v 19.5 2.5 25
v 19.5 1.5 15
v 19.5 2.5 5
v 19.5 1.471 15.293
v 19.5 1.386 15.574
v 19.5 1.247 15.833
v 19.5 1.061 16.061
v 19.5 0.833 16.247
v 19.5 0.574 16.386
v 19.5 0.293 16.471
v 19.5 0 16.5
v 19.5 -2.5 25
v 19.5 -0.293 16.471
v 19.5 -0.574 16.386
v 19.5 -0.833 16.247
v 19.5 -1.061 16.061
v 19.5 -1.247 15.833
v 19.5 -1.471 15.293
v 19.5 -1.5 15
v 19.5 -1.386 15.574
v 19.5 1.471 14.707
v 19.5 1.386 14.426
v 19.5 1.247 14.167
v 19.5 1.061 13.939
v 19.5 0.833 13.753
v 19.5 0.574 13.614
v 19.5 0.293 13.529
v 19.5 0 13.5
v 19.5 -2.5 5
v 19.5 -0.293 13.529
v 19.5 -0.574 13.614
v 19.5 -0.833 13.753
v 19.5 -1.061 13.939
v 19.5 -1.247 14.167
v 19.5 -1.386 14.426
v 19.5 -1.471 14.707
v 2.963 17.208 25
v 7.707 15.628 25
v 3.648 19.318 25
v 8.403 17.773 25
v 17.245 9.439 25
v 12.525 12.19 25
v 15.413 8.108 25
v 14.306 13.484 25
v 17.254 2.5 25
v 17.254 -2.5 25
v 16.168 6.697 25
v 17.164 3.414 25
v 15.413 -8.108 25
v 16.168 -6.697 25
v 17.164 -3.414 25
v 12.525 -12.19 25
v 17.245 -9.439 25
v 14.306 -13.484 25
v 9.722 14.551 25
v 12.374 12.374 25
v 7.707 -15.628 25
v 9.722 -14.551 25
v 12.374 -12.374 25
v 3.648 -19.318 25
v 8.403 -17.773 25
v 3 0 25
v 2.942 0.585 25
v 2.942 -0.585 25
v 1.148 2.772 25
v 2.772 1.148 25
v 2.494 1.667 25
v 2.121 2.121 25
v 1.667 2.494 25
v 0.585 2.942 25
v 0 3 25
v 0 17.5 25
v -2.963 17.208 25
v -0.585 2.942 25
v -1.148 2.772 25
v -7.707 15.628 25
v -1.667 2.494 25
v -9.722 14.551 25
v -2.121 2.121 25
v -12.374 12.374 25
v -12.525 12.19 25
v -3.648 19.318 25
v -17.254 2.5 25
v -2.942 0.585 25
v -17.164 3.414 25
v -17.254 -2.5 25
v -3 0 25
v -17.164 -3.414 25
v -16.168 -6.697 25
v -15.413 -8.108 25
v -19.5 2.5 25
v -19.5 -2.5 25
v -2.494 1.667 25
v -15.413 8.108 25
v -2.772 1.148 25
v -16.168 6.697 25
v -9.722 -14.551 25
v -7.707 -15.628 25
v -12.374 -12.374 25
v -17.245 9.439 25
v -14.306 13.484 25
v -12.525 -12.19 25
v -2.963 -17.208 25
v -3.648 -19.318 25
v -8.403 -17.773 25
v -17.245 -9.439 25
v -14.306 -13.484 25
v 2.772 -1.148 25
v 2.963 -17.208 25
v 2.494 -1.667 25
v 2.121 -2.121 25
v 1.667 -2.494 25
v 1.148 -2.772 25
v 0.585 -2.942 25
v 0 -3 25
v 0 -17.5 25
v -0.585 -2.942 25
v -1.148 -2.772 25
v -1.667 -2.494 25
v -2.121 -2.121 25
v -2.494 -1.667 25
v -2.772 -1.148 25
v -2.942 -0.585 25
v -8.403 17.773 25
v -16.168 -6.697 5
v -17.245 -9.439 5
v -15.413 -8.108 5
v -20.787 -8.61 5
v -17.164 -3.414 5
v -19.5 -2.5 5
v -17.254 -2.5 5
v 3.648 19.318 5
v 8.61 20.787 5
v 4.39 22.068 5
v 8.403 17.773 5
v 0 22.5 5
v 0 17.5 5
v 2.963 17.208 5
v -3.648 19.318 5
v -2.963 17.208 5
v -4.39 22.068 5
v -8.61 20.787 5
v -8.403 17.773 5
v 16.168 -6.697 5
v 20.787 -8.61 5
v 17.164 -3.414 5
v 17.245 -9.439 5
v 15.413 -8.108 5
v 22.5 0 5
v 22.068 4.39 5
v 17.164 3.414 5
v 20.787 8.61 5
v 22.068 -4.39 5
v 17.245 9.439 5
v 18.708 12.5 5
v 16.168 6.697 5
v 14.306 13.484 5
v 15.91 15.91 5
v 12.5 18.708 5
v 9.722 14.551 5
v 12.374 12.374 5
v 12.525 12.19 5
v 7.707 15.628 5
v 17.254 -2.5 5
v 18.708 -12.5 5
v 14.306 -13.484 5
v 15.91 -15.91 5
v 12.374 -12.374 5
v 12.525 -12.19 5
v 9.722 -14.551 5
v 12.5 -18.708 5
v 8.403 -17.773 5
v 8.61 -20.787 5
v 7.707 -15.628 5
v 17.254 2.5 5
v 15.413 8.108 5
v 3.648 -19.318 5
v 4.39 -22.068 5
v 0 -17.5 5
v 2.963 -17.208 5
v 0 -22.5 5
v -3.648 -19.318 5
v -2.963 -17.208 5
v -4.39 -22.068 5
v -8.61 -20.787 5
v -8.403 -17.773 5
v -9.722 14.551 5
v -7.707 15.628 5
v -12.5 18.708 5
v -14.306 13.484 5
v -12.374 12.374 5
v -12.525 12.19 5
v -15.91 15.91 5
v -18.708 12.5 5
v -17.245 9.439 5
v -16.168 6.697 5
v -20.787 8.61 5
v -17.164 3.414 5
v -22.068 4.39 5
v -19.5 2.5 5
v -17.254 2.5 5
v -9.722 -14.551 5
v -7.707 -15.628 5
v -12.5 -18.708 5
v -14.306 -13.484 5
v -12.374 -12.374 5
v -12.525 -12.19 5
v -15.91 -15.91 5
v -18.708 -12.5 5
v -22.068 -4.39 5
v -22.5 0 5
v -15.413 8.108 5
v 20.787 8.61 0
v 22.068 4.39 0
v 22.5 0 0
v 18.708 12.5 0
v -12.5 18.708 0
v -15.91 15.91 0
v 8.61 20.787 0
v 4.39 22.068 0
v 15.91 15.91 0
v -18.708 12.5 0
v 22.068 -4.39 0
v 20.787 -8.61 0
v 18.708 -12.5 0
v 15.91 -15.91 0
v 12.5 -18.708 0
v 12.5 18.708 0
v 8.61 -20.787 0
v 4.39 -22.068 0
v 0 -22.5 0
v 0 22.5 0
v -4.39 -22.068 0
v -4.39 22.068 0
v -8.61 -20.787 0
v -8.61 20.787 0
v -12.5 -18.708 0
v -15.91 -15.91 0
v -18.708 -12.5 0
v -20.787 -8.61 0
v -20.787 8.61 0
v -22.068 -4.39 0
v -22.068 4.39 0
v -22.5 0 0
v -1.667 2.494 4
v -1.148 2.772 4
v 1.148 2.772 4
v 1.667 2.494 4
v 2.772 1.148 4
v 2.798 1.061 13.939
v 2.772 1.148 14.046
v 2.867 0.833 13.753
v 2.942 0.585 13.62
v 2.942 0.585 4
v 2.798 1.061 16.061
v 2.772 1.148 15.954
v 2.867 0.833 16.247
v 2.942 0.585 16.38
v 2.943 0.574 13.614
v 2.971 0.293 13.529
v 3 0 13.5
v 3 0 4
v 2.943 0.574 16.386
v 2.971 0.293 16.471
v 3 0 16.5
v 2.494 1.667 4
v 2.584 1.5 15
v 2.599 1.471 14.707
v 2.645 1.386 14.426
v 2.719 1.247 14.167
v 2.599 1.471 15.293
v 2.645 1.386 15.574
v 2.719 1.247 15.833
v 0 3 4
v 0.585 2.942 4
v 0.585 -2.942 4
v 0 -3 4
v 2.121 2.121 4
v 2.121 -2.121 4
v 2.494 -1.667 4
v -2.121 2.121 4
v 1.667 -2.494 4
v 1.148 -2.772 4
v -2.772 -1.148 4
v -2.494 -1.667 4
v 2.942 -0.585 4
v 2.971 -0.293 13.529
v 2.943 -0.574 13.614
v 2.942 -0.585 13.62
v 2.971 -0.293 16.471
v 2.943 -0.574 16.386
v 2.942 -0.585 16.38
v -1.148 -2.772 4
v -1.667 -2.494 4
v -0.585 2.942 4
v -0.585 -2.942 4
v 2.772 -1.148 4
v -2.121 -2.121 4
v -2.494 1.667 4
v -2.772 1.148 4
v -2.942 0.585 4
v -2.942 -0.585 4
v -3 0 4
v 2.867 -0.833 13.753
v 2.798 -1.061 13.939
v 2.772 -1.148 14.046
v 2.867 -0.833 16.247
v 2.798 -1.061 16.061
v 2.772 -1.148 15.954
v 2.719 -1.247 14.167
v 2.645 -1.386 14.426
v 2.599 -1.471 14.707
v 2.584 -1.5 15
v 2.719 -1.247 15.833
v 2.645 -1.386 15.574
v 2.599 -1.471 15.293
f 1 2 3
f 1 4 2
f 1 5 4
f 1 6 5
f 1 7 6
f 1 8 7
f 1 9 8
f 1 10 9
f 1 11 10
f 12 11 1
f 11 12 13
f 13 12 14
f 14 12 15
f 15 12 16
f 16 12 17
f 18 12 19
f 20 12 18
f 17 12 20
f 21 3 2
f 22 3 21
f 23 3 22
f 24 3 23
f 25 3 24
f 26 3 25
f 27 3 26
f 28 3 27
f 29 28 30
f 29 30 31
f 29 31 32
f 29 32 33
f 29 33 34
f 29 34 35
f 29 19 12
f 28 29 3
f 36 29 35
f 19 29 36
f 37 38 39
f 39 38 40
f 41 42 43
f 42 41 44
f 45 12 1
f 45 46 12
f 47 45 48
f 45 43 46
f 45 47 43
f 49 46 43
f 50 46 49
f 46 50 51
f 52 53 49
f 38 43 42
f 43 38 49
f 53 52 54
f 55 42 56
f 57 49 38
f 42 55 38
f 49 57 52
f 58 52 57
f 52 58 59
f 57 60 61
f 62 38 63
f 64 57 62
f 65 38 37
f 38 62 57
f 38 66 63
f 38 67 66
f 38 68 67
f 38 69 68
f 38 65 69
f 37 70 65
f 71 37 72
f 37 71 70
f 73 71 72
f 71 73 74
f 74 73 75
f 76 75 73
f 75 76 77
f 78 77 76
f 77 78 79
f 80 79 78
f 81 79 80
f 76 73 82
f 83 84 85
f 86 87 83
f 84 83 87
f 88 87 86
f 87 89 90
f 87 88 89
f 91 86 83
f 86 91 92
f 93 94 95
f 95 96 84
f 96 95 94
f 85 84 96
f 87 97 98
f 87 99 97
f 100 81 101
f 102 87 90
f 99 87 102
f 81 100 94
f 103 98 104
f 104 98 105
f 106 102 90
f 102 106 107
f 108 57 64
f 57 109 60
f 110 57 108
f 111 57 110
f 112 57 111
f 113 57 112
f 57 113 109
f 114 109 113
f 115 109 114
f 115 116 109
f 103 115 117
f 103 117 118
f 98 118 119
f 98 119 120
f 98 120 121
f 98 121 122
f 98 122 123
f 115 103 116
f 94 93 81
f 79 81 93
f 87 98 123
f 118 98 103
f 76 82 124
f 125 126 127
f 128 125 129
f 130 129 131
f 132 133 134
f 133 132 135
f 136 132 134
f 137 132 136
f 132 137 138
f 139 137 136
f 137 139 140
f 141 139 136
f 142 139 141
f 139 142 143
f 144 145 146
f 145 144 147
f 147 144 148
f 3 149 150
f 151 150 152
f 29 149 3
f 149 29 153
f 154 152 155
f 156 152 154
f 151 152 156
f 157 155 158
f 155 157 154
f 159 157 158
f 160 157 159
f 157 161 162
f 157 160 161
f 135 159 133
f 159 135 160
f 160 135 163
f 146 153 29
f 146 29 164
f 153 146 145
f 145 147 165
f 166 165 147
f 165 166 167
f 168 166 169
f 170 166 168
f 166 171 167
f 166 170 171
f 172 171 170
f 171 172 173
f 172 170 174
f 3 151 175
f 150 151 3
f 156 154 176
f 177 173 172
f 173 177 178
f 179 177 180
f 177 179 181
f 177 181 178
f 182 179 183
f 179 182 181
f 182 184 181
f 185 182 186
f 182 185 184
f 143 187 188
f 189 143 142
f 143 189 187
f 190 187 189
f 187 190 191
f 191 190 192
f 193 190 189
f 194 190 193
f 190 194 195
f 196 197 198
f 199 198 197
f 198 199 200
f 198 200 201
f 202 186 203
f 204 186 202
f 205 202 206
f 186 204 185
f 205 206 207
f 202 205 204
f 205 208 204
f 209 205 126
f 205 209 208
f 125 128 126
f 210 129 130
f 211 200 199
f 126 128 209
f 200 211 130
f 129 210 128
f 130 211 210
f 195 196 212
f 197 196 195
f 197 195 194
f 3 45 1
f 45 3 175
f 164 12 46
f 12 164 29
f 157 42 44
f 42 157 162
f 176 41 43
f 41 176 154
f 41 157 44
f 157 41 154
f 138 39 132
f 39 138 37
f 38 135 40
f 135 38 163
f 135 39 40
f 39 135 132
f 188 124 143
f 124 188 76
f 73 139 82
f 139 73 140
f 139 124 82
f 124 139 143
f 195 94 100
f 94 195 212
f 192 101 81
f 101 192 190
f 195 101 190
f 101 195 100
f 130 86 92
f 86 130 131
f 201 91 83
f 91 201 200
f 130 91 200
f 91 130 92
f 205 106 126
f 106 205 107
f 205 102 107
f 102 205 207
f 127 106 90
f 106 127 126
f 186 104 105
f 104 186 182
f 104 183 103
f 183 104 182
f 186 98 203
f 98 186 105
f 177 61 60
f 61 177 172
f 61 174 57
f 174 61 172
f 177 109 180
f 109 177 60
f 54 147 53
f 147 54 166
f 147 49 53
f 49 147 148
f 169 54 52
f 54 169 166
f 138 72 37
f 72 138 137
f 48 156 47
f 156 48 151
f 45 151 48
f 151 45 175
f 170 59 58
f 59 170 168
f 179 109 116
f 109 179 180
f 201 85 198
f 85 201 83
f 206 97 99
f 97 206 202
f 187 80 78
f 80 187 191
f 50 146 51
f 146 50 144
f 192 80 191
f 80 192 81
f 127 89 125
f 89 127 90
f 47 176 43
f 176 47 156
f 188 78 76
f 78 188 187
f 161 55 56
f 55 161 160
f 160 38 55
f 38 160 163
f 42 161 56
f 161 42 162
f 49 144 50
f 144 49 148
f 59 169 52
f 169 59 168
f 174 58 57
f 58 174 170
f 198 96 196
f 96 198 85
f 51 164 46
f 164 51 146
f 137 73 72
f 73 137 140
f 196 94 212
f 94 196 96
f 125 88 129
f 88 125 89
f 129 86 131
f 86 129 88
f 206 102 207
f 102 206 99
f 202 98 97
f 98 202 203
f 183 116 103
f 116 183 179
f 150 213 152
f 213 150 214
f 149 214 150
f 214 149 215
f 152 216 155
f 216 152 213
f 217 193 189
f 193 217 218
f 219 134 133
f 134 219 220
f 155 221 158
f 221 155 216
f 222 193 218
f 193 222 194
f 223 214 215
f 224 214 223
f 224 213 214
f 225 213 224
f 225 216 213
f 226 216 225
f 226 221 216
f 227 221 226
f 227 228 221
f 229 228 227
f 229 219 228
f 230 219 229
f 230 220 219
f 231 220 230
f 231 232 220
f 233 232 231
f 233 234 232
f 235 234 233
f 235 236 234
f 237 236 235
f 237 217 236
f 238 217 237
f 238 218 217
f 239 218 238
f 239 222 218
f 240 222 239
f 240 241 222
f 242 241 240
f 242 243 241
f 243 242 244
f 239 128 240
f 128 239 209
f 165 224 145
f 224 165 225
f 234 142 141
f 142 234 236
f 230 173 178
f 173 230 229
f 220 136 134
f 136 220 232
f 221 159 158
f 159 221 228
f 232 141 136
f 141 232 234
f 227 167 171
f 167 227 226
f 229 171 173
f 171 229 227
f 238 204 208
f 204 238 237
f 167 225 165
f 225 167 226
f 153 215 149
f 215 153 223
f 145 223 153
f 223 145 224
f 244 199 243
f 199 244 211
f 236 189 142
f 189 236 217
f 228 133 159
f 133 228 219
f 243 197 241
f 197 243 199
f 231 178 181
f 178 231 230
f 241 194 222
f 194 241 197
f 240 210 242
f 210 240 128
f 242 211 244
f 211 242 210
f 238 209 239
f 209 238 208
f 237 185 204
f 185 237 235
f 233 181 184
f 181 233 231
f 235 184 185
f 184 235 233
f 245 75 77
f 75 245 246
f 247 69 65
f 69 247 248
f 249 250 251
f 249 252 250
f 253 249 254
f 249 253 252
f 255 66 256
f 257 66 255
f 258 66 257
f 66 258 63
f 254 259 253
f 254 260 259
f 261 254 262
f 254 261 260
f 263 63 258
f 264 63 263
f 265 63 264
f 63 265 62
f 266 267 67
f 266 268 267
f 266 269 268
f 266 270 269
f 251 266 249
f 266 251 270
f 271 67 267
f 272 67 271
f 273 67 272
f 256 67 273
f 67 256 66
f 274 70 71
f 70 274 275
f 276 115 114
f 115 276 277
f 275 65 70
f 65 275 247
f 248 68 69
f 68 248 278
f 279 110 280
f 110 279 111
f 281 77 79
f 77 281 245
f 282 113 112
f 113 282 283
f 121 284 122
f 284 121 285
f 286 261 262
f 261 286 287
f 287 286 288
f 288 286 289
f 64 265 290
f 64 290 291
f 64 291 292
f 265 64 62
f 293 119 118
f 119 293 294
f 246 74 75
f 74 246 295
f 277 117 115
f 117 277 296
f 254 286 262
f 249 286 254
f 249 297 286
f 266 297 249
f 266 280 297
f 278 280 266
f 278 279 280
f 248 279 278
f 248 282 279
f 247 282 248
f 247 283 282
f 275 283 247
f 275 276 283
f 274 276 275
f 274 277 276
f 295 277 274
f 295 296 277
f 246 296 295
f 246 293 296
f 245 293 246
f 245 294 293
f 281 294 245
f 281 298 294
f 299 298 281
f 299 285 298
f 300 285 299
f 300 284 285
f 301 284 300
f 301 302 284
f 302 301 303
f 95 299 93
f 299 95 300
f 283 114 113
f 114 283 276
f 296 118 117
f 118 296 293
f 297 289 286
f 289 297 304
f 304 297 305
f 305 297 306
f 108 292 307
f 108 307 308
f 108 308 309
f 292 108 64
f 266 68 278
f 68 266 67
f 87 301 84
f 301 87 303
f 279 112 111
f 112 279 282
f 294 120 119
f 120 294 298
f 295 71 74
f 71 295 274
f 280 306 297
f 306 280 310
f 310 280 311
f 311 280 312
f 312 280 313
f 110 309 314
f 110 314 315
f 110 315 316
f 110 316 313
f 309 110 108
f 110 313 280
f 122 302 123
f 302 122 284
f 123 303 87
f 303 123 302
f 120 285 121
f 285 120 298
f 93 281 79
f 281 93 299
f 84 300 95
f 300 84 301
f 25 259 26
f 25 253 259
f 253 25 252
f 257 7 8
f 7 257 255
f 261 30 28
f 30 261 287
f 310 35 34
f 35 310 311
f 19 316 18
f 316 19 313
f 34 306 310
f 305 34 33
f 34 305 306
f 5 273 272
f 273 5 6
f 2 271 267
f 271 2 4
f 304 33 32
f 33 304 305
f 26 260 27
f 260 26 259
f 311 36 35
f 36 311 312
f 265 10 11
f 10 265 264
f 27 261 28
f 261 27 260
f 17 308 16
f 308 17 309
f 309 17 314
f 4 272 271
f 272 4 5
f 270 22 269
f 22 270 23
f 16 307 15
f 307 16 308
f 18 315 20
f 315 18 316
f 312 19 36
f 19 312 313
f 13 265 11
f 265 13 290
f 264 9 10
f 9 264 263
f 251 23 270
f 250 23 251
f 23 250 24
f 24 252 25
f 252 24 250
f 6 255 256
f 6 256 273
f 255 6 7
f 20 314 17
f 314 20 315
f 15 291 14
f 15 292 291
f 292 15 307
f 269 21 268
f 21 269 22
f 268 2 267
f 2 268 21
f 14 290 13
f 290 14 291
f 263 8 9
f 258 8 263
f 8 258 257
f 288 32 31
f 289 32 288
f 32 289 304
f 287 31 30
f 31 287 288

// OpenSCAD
$fn = 32;

// ----------------------------------------------------------------------
// Control knob: skirt knob with grip ribs
// ----------------------------------------------------------------------

// --- parameters (mm) ---
skirt_d = 45;             // skirt diameter
skirt_t = 5;              // skirt thickness
rib_w = 5;                // grip rib width
rib_out = 3;              // grip rib radial protrusion
n_ribs = 10;              // number of grip ribs
knob_d = 35;              // knob body diameter
knob_h = 20;              // knob body height
bore_d = 6;               // shaft bore diameter
set_d = 3;                // set screw bore diameter

rib_step = 360 / n_ribs;  // rib angular step
total_h = skirt_t + knob_h;  // overall height

difference() {
  union() {
    translate([0, 0, skirt_t]) cylinder(h = knob_h, d = knob_d);
    cylinder(h = skirt_t, d = skirt_d);
    for (i = [0 : n_ribs - 1])
      rotate([0, 0, i * rib_step])
        translate([knob_d / 2 - 1, -rib_w / 2, skirt_t])
          cube([rib_out, rib_w, knob_h]);
  }
  translate([0, 0, skirt_t - 1]) cylinder(h = knob_h + 2, d = bore_d);
  translate([-1, 0, skirt_t + knob_h / 2]) rotate([0, 90, 0])
    cylinder(h = knob_d / 2 + bore_d / 2 + 2, d = set_d);
}
